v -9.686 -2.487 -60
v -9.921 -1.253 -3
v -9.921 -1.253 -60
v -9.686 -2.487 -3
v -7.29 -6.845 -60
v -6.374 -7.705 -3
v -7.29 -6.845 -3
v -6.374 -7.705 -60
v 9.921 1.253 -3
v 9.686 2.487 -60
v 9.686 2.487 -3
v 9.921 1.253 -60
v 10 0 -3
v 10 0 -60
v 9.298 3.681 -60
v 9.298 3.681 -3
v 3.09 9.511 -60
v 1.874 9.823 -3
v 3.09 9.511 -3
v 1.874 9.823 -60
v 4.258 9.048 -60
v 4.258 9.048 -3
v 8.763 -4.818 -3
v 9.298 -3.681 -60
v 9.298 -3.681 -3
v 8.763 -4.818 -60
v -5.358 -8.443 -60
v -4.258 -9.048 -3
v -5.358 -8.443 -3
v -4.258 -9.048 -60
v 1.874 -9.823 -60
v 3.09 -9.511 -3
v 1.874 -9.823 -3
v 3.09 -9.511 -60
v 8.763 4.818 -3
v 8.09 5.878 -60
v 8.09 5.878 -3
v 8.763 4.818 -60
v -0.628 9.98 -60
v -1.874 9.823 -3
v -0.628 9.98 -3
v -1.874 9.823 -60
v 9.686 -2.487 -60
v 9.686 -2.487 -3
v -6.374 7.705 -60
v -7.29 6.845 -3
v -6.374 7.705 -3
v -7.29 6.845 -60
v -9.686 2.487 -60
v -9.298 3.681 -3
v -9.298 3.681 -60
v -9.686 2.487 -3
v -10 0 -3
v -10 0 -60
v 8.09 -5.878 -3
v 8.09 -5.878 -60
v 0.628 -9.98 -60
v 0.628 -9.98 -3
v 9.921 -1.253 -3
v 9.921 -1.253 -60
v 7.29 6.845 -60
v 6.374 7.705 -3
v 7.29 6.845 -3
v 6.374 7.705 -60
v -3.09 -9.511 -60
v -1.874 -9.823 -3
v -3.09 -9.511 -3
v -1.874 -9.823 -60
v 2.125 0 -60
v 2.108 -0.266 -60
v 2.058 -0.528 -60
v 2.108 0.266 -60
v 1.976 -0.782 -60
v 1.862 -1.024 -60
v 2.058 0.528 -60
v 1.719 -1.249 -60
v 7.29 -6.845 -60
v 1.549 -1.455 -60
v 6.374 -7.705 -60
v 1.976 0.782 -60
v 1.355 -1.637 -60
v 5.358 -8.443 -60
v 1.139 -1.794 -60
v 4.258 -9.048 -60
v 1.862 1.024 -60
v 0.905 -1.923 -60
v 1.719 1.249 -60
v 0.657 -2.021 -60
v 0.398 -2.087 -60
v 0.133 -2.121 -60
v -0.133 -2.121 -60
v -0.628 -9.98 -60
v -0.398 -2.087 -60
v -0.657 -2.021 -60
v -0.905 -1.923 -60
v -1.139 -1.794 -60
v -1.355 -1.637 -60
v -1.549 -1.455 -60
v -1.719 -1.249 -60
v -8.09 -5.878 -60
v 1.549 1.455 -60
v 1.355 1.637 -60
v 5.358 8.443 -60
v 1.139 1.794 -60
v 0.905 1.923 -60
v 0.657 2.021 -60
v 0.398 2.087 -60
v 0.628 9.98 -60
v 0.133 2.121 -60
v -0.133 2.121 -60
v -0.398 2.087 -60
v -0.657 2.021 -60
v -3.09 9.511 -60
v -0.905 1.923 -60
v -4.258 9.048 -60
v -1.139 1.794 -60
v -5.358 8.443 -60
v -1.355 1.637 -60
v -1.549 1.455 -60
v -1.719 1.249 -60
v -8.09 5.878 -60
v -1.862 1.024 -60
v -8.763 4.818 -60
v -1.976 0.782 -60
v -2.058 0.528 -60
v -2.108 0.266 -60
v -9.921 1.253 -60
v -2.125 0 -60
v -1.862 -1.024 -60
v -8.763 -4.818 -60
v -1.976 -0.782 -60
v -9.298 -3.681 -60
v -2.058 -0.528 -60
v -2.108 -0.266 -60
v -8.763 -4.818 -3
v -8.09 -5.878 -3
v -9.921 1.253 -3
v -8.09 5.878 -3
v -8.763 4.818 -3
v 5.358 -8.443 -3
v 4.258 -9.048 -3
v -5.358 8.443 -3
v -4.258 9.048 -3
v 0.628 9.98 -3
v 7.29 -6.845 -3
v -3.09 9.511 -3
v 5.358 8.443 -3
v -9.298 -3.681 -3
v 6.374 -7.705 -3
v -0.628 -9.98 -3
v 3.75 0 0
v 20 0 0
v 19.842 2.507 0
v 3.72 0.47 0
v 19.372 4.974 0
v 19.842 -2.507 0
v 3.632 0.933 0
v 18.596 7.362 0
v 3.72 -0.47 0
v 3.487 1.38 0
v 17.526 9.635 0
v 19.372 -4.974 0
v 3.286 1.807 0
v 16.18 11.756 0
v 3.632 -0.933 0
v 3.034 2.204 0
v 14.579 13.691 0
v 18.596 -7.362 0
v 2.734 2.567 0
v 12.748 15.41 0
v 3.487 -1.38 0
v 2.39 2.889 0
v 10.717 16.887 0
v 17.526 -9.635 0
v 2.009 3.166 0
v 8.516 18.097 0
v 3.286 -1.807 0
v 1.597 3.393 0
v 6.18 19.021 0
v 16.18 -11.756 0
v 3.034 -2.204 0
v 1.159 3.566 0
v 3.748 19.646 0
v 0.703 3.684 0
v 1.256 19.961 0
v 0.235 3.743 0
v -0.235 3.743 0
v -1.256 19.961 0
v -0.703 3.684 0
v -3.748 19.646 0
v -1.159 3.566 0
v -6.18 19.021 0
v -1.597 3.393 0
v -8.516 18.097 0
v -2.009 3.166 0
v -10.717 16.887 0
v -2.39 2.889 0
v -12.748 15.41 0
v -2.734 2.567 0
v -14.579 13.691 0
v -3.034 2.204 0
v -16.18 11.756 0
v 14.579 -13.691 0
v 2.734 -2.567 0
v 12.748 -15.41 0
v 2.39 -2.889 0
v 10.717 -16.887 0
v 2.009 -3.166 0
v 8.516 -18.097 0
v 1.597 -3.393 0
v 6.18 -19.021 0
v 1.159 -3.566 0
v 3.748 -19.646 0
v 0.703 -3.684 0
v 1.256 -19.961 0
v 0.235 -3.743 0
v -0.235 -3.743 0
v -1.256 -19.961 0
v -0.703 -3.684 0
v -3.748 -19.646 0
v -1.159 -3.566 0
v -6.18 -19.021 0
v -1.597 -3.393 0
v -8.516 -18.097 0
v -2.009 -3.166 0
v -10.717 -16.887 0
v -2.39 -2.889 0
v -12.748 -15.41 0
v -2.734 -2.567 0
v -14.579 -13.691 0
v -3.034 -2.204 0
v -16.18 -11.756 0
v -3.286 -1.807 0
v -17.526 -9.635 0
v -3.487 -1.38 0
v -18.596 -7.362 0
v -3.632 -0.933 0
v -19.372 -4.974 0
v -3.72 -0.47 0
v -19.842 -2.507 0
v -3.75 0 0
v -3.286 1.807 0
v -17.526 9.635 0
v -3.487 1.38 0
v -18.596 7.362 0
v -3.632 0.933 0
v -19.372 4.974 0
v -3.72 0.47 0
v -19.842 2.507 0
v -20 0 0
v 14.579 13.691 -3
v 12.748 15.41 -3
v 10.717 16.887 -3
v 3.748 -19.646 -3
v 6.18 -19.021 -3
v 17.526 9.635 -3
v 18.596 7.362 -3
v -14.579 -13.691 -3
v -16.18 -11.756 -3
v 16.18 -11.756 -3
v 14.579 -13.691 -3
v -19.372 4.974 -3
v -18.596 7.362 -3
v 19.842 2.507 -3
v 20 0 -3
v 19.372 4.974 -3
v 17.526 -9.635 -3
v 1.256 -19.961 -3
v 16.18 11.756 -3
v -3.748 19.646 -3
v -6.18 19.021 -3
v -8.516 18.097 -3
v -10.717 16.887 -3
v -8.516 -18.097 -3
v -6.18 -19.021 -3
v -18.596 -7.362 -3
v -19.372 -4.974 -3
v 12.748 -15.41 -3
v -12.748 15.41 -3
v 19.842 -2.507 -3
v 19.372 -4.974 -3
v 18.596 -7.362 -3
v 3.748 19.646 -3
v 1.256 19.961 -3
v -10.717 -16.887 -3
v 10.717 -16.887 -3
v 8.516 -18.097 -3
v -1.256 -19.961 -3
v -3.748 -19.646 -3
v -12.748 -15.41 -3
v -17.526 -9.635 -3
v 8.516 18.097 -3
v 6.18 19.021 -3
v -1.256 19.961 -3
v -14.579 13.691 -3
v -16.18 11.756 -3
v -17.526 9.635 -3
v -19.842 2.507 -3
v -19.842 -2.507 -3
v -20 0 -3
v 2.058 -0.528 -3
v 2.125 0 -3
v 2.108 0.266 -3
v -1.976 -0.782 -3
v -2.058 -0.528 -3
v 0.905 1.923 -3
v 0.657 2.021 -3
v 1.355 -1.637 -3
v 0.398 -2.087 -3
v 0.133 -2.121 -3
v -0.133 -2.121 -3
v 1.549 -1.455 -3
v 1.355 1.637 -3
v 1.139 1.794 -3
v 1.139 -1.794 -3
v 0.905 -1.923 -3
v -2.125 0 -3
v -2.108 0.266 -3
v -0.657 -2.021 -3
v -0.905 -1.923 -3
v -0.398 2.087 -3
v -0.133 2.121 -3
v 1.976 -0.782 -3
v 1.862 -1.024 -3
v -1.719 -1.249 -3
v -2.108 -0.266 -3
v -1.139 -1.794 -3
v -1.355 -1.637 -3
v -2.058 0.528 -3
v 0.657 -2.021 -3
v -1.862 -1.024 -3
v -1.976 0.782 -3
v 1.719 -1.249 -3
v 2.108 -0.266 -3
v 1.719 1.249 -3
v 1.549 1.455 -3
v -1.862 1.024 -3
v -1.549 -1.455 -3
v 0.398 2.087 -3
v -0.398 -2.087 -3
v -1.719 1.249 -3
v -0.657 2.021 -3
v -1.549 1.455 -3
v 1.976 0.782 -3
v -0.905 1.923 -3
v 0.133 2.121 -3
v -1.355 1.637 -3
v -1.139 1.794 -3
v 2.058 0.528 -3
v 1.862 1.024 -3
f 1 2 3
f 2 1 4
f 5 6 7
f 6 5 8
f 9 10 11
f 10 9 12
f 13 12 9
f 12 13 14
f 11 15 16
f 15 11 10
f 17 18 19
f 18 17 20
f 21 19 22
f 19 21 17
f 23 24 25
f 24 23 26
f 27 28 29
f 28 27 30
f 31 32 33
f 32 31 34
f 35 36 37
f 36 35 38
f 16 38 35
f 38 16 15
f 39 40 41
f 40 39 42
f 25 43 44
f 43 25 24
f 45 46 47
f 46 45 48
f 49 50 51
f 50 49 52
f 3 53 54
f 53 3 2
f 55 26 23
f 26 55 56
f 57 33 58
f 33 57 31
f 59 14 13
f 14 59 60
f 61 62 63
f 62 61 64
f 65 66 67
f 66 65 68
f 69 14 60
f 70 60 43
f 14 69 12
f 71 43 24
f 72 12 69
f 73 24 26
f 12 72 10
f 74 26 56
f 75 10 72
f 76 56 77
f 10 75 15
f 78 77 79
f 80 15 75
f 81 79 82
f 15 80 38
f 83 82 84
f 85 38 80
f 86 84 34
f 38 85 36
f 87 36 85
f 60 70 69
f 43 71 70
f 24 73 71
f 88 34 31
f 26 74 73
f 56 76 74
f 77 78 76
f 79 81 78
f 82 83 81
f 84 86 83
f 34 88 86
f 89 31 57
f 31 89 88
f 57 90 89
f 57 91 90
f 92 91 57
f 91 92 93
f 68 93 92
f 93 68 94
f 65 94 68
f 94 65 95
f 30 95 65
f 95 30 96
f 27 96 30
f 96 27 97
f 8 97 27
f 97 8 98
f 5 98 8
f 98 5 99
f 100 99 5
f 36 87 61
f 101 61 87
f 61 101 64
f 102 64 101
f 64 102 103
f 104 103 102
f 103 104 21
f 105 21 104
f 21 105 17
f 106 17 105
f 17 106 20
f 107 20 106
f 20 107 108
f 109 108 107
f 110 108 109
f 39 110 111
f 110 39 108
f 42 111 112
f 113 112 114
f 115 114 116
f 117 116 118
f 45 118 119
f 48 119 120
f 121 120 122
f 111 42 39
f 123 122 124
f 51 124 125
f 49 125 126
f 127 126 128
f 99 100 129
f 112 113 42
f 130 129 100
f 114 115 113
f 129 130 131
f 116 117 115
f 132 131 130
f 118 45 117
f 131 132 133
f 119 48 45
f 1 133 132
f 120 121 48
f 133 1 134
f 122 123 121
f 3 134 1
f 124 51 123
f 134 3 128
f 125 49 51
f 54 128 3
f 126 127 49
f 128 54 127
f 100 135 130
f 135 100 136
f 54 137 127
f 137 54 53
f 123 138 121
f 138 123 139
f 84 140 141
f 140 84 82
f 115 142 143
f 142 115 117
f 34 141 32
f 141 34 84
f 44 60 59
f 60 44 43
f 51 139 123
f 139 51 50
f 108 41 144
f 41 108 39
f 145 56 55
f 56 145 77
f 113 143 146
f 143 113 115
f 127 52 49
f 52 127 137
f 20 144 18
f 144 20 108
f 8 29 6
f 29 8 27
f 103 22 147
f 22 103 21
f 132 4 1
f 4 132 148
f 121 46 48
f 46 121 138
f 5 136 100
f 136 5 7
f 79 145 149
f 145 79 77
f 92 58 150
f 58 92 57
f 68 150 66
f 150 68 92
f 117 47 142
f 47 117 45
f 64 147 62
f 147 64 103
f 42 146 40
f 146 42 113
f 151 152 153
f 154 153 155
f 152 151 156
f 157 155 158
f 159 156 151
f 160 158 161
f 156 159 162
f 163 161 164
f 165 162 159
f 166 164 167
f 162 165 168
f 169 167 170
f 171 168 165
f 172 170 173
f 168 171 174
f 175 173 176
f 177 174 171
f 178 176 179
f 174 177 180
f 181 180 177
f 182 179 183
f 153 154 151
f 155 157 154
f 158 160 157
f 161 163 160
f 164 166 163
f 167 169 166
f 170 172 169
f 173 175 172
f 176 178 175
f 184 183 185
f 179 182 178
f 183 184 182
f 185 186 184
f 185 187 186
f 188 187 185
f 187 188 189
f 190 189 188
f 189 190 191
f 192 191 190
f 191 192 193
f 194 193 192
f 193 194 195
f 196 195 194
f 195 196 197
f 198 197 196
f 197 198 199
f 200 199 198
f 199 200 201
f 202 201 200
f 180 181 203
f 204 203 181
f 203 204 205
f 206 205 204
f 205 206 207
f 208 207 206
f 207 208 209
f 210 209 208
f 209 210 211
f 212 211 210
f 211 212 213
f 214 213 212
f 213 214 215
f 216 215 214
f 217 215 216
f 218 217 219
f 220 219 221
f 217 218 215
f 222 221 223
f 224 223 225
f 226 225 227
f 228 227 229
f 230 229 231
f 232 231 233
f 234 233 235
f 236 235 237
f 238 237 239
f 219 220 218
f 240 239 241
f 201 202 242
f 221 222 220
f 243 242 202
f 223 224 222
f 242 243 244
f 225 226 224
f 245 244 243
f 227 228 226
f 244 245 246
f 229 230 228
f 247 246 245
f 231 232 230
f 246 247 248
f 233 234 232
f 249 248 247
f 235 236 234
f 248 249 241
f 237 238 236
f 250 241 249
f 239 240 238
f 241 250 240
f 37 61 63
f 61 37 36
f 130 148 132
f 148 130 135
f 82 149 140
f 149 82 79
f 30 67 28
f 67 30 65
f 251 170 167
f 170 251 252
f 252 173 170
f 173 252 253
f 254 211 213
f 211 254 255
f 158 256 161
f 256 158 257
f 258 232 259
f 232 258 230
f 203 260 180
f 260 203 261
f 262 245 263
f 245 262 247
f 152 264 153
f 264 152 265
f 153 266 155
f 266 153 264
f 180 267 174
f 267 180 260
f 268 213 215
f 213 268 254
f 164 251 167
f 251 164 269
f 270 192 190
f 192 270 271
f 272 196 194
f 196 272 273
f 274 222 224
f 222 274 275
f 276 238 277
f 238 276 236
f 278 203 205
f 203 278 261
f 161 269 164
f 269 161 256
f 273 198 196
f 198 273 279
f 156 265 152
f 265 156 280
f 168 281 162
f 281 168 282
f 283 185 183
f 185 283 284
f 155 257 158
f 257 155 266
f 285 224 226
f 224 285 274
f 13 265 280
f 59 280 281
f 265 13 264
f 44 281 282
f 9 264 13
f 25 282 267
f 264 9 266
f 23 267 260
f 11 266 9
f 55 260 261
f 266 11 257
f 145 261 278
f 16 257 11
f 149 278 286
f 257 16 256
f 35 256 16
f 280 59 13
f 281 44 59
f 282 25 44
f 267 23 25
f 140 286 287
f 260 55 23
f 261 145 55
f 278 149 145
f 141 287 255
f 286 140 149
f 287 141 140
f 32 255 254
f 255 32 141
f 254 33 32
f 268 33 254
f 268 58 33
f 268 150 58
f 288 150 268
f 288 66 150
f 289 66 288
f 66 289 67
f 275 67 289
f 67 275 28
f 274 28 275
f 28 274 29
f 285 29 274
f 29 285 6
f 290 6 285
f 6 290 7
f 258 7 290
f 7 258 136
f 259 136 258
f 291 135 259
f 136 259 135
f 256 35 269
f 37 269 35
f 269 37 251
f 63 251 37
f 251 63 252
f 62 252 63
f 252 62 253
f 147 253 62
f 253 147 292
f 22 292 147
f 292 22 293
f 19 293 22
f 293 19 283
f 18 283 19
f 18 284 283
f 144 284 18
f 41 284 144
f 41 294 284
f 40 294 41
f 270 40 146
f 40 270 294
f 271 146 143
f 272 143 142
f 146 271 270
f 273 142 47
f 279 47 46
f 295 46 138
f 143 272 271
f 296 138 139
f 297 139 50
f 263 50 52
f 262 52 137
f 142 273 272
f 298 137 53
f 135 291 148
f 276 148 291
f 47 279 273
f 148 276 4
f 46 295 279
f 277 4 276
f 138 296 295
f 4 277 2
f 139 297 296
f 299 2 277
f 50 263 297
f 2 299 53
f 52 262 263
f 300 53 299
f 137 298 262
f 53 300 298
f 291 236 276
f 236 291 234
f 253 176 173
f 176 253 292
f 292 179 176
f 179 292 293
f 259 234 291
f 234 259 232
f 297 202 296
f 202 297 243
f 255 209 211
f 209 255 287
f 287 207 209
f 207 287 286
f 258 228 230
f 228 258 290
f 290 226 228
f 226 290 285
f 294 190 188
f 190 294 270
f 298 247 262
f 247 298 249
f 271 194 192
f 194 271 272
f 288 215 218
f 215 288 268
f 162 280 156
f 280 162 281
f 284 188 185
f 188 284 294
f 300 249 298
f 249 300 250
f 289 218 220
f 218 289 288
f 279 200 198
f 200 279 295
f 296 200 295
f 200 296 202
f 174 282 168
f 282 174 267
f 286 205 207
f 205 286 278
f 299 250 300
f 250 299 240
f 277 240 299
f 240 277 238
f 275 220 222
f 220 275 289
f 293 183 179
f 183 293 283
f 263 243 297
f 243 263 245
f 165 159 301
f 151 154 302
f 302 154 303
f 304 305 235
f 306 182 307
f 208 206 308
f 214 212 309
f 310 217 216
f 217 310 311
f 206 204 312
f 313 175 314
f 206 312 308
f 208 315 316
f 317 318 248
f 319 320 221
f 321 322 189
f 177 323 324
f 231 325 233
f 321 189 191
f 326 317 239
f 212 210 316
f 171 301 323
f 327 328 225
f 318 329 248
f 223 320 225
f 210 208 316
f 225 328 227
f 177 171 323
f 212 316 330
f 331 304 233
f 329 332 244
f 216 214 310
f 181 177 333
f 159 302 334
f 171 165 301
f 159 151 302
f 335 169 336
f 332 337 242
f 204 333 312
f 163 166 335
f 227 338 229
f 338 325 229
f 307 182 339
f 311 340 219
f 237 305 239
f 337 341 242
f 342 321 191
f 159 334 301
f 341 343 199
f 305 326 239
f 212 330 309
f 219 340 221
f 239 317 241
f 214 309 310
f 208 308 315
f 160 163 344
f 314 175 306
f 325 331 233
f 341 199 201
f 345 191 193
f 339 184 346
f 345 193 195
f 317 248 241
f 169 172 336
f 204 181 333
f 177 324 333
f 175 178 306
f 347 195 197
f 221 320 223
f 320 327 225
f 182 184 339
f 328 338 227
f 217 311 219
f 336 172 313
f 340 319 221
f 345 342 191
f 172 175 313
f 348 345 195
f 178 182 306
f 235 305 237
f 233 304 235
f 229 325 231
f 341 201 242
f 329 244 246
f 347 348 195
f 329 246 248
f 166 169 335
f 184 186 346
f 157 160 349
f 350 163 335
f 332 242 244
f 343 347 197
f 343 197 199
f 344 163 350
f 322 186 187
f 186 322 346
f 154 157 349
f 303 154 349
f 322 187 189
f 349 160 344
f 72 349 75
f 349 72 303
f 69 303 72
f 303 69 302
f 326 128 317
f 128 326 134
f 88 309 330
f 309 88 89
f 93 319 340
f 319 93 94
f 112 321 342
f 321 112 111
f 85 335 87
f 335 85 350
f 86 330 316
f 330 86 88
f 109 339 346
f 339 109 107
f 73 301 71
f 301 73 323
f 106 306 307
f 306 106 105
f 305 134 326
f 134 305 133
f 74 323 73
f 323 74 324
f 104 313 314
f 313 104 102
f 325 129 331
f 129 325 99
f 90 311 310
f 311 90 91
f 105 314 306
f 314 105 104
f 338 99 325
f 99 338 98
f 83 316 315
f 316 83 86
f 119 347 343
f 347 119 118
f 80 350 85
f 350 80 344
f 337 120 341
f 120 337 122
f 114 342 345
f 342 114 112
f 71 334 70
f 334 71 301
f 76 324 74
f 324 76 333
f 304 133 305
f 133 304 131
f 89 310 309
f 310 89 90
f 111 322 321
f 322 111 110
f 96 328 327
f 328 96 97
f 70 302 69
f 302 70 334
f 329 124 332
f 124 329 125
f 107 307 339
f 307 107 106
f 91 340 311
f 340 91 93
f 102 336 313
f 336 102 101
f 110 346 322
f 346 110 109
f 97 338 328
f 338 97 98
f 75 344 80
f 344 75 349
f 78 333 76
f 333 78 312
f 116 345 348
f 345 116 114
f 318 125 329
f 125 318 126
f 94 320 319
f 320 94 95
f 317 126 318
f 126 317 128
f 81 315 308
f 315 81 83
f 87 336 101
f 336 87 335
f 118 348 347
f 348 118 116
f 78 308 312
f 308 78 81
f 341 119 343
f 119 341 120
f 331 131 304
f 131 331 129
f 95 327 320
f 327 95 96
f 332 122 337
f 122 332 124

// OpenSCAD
$fn = 50;


difference() {
	union() {
		translate(v = [0, 0, -60.0000000000]) {
			cylinder(h = 60, r = 10.0000000000);
		}
		translate(v = [0, 0, -3.0000000000]) {
			cylinder(h = 3, r = 20.0000000000);
		}
	}
	union() {
		translate(v = [0, 0, 0]) {
			rotate(a = [0, 0, 0]) {
				difference() {
					union() {
						#translate(v = [0, 0, -60.0000000000]) {
							cylinder(h = 60, r = 2.0000000000);
						}
						#translate(v = [0, 0, -3]) {
							cylinder(h = 3, r1 = 2.1250000000, r2 = 3.7500000000);
						}
						#translate(v = [0, 0, -60.0000000000]) {
							cylinder(h = 60, r = 2.1250000000);
						}
						#translate(v = [0, 0, -60.0000000000]) {
							cylinder(h = 60, r = 2.0000000000);
						}
					}
					union();
				}
			}
		}
	}
}
